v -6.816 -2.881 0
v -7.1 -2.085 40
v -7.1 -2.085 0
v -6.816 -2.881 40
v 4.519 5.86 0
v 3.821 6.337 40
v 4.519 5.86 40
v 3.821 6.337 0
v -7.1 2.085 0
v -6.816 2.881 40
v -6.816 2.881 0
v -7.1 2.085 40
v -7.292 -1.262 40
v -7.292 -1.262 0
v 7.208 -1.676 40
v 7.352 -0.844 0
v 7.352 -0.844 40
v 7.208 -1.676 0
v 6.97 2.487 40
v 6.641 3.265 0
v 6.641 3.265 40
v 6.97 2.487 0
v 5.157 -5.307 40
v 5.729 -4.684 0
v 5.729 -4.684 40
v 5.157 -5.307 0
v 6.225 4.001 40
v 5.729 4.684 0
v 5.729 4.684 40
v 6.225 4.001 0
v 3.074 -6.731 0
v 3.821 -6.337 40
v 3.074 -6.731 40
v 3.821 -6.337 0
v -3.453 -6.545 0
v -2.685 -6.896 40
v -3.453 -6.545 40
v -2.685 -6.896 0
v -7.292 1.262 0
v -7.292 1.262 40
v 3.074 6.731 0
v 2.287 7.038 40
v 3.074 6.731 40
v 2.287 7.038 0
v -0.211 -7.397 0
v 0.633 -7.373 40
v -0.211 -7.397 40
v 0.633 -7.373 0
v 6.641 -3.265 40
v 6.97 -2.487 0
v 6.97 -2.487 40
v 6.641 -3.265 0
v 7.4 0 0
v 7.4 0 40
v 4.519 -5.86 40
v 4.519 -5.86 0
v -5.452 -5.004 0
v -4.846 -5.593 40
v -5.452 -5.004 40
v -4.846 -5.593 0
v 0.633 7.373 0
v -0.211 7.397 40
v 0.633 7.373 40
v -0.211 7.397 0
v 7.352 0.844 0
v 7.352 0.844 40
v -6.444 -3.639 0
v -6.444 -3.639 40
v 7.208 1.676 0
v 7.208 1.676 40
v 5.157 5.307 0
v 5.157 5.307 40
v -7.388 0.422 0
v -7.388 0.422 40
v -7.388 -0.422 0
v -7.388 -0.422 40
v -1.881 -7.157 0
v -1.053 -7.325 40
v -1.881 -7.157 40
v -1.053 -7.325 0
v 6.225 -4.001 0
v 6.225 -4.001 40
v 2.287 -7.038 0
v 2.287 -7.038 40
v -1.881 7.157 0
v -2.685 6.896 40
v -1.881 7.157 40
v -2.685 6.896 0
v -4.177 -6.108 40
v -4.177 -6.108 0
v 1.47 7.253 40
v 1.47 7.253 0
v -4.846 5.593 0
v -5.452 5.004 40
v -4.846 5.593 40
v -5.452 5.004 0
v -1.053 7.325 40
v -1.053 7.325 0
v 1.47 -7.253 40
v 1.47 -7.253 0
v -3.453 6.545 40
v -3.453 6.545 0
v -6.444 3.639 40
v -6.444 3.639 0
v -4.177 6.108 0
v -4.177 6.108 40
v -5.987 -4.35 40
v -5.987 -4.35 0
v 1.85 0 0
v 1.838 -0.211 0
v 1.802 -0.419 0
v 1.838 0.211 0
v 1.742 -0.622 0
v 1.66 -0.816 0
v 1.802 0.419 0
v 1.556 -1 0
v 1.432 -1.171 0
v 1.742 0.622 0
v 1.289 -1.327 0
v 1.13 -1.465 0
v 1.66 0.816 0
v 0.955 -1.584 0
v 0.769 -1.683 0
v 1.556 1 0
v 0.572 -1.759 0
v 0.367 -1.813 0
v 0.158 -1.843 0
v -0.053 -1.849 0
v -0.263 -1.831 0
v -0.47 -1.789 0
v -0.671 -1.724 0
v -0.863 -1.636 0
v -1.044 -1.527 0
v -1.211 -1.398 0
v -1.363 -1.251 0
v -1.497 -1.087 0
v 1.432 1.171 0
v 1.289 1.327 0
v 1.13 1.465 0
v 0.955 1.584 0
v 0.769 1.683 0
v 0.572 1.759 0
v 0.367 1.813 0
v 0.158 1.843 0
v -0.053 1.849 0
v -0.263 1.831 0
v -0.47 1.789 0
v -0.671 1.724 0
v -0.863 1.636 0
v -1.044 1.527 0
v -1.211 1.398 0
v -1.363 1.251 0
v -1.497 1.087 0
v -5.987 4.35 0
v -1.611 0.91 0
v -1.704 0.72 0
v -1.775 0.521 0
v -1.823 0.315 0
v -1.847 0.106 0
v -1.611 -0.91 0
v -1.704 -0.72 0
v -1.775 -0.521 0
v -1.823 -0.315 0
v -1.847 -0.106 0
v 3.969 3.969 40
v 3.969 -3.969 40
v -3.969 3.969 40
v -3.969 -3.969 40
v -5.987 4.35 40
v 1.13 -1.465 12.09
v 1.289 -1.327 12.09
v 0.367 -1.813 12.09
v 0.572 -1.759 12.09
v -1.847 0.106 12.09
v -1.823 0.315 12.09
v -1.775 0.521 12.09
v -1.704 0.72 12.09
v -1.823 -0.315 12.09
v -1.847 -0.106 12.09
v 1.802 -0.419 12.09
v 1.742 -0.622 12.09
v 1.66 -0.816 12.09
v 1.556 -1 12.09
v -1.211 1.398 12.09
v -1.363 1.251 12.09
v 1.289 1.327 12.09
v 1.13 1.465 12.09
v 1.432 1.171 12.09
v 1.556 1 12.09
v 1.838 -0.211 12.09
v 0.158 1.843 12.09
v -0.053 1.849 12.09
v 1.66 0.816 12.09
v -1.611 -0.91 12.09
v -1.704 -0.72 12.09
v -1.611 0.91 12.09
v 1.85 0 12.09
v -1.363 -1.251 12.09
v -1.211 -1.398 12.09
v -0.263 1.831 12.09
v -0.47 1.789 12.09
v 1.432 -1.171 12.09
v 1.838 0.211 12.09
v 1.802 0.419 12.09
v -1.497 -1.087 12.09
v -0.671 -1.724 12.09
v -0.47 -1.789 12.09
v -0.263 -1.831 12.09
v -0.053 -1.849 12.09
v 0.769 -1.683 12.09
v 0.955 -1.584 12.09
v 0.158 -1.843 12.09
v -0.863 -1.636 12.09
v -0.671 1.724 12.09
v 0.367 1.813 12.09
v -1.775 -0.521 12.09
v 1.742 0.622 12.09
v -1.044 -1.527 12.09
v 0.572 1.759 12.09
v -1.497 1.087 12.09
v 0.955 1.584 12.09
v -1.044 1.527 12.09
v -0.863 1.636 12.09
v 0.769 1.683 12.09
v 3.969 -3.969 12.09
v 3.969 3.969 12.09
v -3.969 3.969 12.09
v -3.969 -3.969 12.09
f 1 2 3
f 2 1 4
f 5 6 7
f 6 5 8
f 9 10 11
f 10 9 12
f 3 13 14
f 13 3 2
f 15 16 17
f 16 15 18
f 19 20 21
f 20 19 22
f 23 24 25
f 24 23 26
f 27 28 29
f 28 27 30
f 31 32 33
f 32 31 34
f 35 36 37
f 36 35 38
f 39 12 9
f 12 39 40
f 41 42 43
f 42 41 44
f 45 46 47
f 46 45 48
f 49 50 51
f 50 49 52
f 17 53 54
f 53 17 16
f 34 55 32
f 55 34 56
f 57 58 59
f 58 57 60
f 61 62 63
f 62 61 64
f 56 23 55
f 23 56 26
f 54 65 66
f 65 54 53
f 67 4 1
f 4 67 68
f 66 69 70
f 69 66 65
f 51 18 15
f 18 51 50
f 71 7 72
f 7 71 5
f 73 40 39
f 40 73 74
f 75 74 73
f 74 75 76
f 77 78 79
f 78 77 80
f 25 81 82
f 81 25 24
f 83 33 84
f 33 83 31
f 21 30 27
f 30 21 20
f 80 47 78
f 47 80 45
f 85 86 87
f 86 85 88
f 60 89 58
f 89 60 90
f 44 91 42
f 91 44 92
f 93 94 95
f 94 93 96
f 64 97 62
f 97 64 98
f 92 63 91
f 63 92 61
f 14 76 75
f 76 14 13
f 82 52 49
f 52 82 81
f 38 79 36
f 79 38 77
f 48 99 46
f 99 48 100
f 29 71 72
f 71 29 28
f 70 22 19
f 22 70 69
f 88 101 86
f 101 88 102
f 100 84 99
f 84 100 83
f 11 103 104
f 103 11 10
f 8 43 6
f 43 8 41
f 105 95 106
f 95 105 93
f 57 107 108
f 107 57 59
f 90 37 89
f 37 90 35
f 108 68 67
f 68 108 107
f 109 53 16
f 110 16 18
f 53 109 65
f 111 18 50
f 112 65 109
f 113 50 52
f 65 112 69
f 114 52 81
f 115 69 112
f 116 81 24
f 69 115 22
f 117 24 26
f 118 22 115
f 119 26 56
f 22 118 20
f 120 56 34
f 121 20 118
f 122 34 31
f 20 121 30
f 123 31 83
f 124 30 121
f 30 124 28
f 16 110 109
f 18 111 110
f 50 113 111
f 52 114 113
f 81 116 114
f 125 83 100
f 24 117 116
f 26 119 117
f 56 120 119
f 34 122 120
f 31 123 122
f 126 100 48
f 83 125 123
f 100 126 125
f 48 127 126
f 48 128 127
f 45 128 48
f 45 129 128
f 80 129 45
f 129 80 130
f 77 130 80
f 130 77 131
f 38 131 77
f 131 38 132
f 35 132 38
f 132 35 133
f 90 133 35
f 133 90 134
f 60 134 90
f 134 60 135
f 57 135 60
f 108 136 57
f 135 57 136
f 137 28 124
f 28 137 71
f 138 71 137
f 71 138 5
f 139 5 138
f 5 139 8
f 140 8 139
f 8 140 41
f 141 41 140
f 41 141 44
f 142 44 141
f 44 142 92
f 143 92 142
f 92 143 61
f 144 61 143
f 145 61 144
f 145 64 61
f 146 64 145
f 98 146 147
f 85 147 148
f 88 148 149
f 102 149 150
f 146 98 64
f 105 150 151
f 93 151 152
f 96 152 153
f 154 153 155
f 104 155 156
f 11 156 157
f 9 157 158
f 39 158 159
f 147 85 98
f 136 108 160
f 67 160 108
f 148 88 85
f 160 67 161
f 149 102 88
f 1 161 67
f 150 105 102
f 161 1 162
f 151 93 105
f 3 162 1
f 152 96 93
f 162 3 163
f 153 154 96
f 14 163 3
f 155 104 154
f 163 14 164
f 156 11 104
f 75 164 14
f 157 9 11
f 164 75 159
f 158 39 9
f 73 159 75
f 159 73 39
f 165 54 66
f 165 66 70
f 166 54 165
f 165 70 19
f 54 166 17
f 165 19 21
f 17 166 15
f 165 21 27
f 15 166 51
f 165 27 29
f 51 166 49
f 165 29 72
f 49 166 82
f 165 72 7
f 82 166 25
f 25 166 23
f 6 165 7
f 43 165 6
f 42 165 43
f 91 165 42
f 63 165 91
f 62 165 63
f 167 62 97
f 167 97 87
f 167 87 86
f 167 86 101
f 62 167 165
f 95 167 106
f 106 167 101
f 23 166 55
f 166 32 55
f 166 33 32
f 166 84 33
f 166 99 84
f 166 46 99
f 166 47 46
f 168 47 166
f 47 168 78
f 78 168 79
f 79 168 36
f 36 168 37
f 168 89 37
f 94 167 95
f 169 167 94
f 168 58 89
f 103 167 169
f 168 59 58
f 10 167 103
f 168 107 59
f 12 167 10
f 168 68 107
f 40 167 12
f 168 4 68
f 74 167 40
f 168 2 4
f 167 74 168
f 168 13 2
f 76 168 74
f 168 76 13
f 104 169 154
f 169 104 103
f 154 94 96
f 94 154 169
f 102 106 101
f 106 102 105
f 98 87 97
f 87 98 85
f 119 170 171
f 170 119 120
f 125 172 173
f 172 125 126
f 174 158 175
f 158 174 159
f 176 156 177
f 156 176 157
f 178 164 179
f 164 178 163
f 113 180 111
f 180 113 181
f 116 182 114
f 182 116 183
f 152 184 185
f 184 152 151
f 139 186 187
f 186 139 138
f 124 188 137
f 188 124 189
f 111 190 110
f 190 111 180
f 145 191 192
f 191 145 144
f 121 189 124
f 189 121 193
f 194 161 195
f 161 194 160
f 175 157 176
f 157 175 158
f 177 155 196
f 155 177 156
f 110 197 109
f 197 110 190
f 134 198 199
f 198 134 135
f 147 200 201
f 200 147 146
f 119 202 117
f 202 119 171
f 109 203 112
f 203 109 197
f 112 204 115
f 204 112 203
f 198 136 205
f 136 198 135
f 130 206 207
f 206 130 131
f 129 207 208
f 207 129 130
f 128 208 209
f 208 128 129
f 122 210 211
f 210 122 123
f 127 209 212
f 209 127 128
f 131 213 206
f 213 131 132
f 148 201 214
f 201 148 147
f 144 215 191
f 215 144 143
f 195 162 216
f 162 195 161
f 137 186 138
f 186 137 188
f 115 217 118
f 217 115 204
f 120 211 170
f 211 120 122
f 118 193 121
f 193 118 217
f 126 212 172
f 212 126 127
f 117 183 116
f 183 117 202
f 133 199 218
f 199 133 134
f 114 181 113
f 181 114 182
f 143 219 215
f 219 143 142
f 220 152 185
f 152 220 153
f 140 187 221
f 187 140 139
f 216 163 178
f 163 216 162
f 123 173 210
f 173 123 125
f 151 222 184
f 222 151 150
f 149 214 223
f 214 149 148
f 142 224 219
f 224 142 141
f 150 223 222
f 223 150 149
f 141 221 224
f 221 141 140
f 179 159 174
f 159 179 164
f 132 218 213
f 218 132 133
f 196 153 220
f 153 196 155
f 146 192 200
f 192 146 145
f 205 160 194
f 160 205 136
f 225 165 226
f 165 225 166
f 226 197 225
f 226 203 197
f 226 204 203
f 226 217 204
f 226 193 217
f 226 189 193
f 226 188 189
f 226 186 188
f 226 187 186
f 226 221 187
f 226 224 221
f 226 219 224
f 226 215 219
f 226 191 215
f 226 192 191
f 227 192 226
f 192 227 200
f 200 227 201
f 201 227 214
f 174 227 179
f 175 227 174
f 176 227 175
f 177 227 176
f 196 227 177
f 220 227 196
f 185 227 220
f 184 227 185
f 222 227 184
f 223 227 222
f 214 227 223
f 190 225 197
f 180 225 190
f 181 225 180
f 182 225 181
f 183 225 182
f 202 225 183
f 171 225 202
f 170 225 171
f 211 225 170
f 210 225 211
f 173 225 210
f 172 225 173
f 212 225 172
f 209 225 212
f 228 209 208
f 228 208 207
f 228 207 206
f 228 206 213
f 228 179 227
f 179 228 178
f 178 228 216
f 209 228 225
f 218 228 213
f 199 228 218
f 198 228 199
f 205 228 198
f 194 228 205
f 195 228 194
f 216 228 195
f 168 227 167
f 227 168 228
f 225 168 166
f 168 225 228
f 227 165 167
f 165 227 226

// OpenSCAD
// Generic foot with #6 bolt and #6 square nut
// Al Williams (al.williams@awce.com or @awce_com)
// Hacked to fit with Customizer template

//	Uncomment the library/libraries of your choice to include them


//CUSTOMIZER VARIABLES

// Units for all custom variables
Units=1;  // [1:mm, 25.4:inches, 0.254:mils]
// Diameter of screw holes, 3.7mm = #6 clearance hole.  if your printer is a little "tight" you might open it up a bit
Bolt_Size=3.7; 
boltsize=Bolt_Size*Units;
// How deep do you want the bolt hole? Should be slightly shorter than the bolt so the nut can engage
Bolt_Depth=12.2;  
boltdepth=Bolt_Depth*Units;
// Size of the square nut (example #6 nut is 5/16 inch which is 7.9375 mm)
Nut_Size=7.9375;
nutsize=Nut_Size*Units;
// Foot height
Total_Height=40;
totalh=Total_Height*Units;


totalw=boltsize*4;    // diameter not radius!

// the .1 fudge factor here makes sure
// there is a clean cut between the bolt hole
// and the nut hole
nutdepth=(totalh-boltdepth)+0.1;


//CUSTOMIZER VARIABLES END


$fn=55+0; // # of arcs in a circle -- higher is better but runs longer

// Some measurements are in inches (original)
in2mm=25.4+0;




// mounting bolt hole
module bolthole()
{
// the .02 makes it stretch a little past the edge
// so the cut is clean
  translate([0,0,totalh-boltdepth])
    cylinder(h=boltdepth+.02,r=boltsize/2); 
    
}

module nuthole()
{
// The .02 makes it stretch a little past the edge
// so the cut is clean
translate([0,0,nutdepth/2])
   {
     cube(size=[nutsize,nutsize, nutdepth+.02],center=true); 
    }
}


// Here we go (translate and rotate so big end is up for printing)
translate([0,0,totalh])
rotate ([180,0,0]) difference () {
    cylinder(r=totalw/2,h=totalh,center=false);
    bolthole();
    nuthole();
}
